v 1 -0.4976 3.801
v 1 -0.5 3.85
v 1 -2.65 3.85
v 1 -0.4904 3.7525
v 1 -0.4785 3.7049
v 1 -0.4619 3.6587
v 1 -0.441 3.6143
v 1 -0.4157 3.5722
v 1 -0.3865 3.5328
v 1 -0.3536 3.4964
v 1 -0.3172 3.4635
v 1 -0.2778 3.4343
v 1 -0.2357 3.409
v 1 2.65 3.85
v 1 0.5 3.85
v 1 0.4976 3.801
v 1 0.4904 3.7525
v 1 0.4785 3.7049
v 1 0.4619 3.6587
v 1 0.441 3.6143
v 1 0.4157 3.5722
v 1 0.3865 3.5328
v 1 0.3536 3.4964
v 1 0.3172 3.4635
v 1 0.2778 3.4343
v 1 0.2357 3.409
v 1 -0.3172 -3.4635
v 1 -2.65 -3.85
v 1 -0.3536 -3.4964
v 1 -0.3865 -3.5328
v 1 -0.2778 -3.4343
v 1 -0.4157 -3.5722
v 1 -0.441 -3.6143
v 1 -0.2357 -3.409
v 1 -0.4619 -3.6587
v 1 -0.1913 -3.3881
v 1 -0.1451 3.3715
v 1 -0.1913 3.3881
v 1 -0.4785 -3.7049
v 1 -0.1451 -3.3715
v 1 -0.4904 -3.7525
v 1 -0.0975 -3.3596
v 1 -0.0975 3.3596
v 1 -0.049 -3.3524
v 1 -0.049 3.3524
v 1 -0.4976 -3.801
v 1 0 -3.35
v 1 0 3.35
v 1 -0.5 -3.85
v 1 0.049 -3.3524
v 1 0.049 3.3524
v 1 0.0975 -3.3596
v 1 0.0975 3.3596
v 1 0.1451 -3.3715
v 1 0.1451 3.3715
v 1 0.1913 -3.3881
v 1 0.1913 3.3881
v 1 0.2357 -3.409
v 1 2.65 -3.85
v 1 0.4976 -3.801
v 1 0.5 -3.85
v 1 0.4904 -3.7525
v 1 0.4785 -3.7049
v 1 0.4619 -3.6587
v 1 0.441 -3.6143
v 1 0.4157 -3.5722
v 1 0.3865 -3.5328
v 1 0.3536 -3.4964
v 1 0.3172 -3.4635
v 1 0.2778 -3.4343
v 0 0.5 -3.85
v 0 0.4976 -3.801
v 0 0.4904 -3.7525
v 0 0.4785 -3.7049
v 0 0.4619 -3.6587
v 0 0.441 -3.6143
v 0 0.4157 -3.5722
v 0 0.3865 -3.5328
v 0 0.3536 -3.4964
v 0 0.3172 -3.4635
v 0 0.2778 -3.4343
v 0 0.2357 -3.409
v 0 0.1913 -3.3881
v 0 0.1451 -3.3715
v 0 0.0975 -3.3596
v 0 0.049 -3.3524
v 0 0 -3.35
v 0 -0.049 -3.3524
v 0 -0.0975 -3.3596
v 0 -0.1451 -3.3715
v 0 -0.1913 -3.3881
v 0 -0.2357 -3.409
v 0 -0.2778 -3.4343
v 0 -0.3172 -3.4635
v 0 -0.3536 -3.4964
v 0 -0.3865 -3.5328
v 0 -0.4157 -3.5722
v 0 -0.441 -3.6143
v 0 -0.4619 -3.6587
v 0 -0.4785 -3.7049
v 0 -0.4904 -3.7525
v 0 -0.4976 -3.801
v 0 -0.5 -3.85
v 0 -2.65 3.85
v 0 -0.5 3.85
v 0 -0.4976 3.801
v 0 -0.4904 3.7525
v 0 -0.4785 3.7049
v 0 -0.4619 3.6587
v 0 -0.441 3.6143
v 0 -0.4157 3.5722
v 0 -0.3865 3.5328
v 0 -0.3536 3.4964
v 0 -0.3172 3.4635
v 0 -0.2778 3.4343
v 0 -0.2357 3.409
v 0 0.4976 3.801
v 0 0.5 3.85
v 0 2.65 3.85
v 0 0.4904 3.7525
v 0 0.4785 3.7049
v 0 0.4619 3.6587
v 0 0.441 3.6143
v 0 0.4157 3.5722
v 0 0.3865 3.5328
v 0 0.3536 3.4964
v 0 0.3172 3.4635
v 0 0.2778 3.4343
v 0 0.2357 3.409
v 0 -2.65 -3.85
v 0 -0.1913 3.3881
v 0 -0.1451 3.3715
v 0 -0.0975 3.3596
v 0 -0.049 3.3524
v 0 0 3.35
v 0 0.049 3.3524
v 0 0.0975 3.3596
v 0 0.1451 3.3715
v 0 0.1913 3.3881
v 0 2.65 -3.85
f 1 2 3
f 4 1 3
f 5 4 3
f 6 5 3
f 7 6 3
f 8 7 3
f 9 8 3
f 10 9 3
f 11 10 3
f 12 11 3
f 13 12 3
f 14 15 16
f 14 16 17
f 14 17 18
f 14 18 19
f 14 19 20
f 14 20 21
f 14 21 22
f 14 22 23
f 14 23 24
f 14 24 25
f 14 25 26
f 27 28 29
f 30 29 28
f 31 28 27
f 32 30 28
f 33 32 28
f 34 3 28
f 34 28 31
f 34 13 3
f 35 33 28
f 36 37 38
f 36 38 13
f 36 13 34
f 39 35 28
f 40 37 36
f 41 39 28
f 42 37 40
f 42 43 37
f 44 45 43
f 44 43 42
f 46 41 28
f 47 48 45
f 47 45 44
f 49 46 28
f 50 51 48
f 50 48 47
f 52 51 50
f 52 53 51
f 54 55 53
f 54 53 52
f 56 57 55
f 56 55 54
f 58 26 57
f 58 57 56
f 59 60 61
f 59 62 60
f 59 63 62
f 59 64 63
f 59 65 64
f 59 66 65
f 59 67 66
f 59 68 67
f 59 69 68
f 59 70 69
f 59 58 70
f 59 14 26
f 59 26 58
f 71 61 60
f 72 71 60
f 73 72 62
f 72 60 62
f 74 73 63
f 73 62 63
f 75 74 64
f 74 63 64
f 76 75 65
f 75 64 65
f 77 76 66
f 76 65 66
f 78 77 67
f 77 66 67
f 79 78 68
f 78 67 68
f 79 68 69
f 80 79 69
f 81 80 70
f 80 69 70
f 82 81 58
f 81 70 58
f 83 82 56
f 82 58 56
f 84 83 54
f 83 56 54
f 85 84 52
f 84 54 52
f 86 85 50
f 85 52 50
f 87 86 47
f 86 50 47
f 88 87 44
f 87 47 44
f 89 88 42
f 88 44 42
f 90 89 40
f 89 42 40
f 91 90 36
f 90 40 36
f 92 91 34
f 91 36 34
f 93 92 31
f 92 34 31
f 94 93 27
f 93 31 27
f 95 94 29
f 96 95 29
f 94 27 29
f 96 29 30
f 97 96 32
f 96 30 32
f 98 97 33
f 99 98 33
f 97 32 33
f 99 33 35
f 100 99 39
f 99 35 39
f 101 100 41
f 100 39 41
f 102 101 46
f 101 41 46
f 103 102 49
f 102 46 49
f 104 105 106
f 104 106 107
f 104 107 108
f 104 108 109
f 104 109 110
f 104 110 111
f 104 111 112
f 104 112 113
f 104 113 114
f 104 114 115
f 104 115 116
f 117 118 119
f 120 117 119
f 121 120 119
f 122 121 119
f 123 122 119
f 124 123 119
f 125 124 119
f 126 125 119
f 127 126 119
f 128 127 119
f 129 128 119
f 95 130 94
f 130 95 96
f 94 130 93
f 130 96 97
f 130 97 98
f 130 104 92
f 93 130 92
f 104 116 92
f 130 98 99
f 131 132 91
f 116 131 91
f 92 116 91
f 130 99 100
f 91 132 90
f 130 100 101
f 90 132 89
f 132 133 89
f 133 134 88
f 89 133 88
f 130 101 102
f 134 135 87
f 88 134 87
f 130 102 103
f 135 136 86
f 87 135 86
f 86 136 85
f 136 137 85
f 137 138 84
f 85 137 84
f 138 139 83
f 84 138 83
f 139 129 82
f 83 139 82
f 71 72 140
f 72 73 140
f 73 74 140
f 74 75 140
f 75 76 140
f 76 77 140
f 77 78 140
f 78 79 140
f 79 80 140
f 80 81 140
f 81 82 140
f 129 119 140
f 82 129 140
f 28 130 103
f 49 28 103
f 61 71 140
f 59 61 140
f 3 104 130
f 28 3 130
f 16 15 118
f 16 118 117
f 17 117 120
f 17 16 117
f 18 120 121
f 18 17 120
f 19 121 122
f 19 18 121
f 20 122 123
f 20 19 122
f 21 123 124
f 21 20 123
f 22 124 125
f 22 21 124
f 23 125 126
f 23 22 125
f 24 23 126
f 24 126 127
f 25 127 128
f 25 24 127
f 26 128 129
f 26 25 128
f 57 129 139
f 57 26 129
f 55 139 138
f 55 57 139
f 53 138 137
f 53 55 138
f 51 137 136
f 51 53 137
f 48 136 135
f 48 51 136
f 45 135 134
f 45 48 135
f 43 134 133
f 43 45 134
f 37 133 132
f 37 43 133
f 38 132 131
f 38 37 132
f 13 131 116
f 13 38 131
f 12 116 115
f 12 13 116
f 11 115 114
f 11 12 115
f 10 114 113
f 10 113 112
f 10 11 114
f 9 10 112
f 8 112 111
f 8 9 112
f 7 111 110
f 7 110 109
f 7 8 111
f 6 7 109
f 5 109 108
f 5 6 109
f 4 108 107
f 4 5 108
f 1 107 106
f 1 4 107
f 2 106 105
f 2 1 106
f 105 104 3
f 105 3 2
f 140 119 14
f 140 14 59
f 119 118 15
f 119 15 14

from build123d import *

# Parameters (mm, degrees)
SKETCH_1_W          = 7.7
SKETCH_1_H          = 5.3
EXTRUDE_1_DEPTH     = 1
CUT_EXTRUDE_1_DEPTH = 1


with BuildPart() as part:
    # 草图1 → 凸台-拉伸1 (new body)
    with BuildSketch(Plane(origin=(0, 0, 0), x_dir=(0, 0, -1), z_dir=(1, 0, 0))):
        Rectangle(SKETCH_1_W, SKETCH_1_H)
    extrude(amount=EXTRUDE_1_DEPTH)

    # 草图2 → 切除-拉伸1 (cut)
    with BuildSketch(Plane(origin=(1, 0, 0), x_dir=(0, 0, -1), z_dir=(1, 0, 0))):
        with BuildLine():
            Line((-3.85, -0.5), (-3.85, 0.5))
            ThreePointArc((-3.85, 0.5), (-3.35, 0), (-3.85, -0.5))
        make_face()
        with BuildLine():
            Line((3.85, -0.5), (3.85, 0.5))
            ThreePointArc((3.85, 0.5), (3.35, 0), (3.85, -0.5))
        make_face()
    extrude(amount=-CUT_EXTRUDE_1_DEPTH, mode=Mode.SUBTRACT)


solid = part.part
